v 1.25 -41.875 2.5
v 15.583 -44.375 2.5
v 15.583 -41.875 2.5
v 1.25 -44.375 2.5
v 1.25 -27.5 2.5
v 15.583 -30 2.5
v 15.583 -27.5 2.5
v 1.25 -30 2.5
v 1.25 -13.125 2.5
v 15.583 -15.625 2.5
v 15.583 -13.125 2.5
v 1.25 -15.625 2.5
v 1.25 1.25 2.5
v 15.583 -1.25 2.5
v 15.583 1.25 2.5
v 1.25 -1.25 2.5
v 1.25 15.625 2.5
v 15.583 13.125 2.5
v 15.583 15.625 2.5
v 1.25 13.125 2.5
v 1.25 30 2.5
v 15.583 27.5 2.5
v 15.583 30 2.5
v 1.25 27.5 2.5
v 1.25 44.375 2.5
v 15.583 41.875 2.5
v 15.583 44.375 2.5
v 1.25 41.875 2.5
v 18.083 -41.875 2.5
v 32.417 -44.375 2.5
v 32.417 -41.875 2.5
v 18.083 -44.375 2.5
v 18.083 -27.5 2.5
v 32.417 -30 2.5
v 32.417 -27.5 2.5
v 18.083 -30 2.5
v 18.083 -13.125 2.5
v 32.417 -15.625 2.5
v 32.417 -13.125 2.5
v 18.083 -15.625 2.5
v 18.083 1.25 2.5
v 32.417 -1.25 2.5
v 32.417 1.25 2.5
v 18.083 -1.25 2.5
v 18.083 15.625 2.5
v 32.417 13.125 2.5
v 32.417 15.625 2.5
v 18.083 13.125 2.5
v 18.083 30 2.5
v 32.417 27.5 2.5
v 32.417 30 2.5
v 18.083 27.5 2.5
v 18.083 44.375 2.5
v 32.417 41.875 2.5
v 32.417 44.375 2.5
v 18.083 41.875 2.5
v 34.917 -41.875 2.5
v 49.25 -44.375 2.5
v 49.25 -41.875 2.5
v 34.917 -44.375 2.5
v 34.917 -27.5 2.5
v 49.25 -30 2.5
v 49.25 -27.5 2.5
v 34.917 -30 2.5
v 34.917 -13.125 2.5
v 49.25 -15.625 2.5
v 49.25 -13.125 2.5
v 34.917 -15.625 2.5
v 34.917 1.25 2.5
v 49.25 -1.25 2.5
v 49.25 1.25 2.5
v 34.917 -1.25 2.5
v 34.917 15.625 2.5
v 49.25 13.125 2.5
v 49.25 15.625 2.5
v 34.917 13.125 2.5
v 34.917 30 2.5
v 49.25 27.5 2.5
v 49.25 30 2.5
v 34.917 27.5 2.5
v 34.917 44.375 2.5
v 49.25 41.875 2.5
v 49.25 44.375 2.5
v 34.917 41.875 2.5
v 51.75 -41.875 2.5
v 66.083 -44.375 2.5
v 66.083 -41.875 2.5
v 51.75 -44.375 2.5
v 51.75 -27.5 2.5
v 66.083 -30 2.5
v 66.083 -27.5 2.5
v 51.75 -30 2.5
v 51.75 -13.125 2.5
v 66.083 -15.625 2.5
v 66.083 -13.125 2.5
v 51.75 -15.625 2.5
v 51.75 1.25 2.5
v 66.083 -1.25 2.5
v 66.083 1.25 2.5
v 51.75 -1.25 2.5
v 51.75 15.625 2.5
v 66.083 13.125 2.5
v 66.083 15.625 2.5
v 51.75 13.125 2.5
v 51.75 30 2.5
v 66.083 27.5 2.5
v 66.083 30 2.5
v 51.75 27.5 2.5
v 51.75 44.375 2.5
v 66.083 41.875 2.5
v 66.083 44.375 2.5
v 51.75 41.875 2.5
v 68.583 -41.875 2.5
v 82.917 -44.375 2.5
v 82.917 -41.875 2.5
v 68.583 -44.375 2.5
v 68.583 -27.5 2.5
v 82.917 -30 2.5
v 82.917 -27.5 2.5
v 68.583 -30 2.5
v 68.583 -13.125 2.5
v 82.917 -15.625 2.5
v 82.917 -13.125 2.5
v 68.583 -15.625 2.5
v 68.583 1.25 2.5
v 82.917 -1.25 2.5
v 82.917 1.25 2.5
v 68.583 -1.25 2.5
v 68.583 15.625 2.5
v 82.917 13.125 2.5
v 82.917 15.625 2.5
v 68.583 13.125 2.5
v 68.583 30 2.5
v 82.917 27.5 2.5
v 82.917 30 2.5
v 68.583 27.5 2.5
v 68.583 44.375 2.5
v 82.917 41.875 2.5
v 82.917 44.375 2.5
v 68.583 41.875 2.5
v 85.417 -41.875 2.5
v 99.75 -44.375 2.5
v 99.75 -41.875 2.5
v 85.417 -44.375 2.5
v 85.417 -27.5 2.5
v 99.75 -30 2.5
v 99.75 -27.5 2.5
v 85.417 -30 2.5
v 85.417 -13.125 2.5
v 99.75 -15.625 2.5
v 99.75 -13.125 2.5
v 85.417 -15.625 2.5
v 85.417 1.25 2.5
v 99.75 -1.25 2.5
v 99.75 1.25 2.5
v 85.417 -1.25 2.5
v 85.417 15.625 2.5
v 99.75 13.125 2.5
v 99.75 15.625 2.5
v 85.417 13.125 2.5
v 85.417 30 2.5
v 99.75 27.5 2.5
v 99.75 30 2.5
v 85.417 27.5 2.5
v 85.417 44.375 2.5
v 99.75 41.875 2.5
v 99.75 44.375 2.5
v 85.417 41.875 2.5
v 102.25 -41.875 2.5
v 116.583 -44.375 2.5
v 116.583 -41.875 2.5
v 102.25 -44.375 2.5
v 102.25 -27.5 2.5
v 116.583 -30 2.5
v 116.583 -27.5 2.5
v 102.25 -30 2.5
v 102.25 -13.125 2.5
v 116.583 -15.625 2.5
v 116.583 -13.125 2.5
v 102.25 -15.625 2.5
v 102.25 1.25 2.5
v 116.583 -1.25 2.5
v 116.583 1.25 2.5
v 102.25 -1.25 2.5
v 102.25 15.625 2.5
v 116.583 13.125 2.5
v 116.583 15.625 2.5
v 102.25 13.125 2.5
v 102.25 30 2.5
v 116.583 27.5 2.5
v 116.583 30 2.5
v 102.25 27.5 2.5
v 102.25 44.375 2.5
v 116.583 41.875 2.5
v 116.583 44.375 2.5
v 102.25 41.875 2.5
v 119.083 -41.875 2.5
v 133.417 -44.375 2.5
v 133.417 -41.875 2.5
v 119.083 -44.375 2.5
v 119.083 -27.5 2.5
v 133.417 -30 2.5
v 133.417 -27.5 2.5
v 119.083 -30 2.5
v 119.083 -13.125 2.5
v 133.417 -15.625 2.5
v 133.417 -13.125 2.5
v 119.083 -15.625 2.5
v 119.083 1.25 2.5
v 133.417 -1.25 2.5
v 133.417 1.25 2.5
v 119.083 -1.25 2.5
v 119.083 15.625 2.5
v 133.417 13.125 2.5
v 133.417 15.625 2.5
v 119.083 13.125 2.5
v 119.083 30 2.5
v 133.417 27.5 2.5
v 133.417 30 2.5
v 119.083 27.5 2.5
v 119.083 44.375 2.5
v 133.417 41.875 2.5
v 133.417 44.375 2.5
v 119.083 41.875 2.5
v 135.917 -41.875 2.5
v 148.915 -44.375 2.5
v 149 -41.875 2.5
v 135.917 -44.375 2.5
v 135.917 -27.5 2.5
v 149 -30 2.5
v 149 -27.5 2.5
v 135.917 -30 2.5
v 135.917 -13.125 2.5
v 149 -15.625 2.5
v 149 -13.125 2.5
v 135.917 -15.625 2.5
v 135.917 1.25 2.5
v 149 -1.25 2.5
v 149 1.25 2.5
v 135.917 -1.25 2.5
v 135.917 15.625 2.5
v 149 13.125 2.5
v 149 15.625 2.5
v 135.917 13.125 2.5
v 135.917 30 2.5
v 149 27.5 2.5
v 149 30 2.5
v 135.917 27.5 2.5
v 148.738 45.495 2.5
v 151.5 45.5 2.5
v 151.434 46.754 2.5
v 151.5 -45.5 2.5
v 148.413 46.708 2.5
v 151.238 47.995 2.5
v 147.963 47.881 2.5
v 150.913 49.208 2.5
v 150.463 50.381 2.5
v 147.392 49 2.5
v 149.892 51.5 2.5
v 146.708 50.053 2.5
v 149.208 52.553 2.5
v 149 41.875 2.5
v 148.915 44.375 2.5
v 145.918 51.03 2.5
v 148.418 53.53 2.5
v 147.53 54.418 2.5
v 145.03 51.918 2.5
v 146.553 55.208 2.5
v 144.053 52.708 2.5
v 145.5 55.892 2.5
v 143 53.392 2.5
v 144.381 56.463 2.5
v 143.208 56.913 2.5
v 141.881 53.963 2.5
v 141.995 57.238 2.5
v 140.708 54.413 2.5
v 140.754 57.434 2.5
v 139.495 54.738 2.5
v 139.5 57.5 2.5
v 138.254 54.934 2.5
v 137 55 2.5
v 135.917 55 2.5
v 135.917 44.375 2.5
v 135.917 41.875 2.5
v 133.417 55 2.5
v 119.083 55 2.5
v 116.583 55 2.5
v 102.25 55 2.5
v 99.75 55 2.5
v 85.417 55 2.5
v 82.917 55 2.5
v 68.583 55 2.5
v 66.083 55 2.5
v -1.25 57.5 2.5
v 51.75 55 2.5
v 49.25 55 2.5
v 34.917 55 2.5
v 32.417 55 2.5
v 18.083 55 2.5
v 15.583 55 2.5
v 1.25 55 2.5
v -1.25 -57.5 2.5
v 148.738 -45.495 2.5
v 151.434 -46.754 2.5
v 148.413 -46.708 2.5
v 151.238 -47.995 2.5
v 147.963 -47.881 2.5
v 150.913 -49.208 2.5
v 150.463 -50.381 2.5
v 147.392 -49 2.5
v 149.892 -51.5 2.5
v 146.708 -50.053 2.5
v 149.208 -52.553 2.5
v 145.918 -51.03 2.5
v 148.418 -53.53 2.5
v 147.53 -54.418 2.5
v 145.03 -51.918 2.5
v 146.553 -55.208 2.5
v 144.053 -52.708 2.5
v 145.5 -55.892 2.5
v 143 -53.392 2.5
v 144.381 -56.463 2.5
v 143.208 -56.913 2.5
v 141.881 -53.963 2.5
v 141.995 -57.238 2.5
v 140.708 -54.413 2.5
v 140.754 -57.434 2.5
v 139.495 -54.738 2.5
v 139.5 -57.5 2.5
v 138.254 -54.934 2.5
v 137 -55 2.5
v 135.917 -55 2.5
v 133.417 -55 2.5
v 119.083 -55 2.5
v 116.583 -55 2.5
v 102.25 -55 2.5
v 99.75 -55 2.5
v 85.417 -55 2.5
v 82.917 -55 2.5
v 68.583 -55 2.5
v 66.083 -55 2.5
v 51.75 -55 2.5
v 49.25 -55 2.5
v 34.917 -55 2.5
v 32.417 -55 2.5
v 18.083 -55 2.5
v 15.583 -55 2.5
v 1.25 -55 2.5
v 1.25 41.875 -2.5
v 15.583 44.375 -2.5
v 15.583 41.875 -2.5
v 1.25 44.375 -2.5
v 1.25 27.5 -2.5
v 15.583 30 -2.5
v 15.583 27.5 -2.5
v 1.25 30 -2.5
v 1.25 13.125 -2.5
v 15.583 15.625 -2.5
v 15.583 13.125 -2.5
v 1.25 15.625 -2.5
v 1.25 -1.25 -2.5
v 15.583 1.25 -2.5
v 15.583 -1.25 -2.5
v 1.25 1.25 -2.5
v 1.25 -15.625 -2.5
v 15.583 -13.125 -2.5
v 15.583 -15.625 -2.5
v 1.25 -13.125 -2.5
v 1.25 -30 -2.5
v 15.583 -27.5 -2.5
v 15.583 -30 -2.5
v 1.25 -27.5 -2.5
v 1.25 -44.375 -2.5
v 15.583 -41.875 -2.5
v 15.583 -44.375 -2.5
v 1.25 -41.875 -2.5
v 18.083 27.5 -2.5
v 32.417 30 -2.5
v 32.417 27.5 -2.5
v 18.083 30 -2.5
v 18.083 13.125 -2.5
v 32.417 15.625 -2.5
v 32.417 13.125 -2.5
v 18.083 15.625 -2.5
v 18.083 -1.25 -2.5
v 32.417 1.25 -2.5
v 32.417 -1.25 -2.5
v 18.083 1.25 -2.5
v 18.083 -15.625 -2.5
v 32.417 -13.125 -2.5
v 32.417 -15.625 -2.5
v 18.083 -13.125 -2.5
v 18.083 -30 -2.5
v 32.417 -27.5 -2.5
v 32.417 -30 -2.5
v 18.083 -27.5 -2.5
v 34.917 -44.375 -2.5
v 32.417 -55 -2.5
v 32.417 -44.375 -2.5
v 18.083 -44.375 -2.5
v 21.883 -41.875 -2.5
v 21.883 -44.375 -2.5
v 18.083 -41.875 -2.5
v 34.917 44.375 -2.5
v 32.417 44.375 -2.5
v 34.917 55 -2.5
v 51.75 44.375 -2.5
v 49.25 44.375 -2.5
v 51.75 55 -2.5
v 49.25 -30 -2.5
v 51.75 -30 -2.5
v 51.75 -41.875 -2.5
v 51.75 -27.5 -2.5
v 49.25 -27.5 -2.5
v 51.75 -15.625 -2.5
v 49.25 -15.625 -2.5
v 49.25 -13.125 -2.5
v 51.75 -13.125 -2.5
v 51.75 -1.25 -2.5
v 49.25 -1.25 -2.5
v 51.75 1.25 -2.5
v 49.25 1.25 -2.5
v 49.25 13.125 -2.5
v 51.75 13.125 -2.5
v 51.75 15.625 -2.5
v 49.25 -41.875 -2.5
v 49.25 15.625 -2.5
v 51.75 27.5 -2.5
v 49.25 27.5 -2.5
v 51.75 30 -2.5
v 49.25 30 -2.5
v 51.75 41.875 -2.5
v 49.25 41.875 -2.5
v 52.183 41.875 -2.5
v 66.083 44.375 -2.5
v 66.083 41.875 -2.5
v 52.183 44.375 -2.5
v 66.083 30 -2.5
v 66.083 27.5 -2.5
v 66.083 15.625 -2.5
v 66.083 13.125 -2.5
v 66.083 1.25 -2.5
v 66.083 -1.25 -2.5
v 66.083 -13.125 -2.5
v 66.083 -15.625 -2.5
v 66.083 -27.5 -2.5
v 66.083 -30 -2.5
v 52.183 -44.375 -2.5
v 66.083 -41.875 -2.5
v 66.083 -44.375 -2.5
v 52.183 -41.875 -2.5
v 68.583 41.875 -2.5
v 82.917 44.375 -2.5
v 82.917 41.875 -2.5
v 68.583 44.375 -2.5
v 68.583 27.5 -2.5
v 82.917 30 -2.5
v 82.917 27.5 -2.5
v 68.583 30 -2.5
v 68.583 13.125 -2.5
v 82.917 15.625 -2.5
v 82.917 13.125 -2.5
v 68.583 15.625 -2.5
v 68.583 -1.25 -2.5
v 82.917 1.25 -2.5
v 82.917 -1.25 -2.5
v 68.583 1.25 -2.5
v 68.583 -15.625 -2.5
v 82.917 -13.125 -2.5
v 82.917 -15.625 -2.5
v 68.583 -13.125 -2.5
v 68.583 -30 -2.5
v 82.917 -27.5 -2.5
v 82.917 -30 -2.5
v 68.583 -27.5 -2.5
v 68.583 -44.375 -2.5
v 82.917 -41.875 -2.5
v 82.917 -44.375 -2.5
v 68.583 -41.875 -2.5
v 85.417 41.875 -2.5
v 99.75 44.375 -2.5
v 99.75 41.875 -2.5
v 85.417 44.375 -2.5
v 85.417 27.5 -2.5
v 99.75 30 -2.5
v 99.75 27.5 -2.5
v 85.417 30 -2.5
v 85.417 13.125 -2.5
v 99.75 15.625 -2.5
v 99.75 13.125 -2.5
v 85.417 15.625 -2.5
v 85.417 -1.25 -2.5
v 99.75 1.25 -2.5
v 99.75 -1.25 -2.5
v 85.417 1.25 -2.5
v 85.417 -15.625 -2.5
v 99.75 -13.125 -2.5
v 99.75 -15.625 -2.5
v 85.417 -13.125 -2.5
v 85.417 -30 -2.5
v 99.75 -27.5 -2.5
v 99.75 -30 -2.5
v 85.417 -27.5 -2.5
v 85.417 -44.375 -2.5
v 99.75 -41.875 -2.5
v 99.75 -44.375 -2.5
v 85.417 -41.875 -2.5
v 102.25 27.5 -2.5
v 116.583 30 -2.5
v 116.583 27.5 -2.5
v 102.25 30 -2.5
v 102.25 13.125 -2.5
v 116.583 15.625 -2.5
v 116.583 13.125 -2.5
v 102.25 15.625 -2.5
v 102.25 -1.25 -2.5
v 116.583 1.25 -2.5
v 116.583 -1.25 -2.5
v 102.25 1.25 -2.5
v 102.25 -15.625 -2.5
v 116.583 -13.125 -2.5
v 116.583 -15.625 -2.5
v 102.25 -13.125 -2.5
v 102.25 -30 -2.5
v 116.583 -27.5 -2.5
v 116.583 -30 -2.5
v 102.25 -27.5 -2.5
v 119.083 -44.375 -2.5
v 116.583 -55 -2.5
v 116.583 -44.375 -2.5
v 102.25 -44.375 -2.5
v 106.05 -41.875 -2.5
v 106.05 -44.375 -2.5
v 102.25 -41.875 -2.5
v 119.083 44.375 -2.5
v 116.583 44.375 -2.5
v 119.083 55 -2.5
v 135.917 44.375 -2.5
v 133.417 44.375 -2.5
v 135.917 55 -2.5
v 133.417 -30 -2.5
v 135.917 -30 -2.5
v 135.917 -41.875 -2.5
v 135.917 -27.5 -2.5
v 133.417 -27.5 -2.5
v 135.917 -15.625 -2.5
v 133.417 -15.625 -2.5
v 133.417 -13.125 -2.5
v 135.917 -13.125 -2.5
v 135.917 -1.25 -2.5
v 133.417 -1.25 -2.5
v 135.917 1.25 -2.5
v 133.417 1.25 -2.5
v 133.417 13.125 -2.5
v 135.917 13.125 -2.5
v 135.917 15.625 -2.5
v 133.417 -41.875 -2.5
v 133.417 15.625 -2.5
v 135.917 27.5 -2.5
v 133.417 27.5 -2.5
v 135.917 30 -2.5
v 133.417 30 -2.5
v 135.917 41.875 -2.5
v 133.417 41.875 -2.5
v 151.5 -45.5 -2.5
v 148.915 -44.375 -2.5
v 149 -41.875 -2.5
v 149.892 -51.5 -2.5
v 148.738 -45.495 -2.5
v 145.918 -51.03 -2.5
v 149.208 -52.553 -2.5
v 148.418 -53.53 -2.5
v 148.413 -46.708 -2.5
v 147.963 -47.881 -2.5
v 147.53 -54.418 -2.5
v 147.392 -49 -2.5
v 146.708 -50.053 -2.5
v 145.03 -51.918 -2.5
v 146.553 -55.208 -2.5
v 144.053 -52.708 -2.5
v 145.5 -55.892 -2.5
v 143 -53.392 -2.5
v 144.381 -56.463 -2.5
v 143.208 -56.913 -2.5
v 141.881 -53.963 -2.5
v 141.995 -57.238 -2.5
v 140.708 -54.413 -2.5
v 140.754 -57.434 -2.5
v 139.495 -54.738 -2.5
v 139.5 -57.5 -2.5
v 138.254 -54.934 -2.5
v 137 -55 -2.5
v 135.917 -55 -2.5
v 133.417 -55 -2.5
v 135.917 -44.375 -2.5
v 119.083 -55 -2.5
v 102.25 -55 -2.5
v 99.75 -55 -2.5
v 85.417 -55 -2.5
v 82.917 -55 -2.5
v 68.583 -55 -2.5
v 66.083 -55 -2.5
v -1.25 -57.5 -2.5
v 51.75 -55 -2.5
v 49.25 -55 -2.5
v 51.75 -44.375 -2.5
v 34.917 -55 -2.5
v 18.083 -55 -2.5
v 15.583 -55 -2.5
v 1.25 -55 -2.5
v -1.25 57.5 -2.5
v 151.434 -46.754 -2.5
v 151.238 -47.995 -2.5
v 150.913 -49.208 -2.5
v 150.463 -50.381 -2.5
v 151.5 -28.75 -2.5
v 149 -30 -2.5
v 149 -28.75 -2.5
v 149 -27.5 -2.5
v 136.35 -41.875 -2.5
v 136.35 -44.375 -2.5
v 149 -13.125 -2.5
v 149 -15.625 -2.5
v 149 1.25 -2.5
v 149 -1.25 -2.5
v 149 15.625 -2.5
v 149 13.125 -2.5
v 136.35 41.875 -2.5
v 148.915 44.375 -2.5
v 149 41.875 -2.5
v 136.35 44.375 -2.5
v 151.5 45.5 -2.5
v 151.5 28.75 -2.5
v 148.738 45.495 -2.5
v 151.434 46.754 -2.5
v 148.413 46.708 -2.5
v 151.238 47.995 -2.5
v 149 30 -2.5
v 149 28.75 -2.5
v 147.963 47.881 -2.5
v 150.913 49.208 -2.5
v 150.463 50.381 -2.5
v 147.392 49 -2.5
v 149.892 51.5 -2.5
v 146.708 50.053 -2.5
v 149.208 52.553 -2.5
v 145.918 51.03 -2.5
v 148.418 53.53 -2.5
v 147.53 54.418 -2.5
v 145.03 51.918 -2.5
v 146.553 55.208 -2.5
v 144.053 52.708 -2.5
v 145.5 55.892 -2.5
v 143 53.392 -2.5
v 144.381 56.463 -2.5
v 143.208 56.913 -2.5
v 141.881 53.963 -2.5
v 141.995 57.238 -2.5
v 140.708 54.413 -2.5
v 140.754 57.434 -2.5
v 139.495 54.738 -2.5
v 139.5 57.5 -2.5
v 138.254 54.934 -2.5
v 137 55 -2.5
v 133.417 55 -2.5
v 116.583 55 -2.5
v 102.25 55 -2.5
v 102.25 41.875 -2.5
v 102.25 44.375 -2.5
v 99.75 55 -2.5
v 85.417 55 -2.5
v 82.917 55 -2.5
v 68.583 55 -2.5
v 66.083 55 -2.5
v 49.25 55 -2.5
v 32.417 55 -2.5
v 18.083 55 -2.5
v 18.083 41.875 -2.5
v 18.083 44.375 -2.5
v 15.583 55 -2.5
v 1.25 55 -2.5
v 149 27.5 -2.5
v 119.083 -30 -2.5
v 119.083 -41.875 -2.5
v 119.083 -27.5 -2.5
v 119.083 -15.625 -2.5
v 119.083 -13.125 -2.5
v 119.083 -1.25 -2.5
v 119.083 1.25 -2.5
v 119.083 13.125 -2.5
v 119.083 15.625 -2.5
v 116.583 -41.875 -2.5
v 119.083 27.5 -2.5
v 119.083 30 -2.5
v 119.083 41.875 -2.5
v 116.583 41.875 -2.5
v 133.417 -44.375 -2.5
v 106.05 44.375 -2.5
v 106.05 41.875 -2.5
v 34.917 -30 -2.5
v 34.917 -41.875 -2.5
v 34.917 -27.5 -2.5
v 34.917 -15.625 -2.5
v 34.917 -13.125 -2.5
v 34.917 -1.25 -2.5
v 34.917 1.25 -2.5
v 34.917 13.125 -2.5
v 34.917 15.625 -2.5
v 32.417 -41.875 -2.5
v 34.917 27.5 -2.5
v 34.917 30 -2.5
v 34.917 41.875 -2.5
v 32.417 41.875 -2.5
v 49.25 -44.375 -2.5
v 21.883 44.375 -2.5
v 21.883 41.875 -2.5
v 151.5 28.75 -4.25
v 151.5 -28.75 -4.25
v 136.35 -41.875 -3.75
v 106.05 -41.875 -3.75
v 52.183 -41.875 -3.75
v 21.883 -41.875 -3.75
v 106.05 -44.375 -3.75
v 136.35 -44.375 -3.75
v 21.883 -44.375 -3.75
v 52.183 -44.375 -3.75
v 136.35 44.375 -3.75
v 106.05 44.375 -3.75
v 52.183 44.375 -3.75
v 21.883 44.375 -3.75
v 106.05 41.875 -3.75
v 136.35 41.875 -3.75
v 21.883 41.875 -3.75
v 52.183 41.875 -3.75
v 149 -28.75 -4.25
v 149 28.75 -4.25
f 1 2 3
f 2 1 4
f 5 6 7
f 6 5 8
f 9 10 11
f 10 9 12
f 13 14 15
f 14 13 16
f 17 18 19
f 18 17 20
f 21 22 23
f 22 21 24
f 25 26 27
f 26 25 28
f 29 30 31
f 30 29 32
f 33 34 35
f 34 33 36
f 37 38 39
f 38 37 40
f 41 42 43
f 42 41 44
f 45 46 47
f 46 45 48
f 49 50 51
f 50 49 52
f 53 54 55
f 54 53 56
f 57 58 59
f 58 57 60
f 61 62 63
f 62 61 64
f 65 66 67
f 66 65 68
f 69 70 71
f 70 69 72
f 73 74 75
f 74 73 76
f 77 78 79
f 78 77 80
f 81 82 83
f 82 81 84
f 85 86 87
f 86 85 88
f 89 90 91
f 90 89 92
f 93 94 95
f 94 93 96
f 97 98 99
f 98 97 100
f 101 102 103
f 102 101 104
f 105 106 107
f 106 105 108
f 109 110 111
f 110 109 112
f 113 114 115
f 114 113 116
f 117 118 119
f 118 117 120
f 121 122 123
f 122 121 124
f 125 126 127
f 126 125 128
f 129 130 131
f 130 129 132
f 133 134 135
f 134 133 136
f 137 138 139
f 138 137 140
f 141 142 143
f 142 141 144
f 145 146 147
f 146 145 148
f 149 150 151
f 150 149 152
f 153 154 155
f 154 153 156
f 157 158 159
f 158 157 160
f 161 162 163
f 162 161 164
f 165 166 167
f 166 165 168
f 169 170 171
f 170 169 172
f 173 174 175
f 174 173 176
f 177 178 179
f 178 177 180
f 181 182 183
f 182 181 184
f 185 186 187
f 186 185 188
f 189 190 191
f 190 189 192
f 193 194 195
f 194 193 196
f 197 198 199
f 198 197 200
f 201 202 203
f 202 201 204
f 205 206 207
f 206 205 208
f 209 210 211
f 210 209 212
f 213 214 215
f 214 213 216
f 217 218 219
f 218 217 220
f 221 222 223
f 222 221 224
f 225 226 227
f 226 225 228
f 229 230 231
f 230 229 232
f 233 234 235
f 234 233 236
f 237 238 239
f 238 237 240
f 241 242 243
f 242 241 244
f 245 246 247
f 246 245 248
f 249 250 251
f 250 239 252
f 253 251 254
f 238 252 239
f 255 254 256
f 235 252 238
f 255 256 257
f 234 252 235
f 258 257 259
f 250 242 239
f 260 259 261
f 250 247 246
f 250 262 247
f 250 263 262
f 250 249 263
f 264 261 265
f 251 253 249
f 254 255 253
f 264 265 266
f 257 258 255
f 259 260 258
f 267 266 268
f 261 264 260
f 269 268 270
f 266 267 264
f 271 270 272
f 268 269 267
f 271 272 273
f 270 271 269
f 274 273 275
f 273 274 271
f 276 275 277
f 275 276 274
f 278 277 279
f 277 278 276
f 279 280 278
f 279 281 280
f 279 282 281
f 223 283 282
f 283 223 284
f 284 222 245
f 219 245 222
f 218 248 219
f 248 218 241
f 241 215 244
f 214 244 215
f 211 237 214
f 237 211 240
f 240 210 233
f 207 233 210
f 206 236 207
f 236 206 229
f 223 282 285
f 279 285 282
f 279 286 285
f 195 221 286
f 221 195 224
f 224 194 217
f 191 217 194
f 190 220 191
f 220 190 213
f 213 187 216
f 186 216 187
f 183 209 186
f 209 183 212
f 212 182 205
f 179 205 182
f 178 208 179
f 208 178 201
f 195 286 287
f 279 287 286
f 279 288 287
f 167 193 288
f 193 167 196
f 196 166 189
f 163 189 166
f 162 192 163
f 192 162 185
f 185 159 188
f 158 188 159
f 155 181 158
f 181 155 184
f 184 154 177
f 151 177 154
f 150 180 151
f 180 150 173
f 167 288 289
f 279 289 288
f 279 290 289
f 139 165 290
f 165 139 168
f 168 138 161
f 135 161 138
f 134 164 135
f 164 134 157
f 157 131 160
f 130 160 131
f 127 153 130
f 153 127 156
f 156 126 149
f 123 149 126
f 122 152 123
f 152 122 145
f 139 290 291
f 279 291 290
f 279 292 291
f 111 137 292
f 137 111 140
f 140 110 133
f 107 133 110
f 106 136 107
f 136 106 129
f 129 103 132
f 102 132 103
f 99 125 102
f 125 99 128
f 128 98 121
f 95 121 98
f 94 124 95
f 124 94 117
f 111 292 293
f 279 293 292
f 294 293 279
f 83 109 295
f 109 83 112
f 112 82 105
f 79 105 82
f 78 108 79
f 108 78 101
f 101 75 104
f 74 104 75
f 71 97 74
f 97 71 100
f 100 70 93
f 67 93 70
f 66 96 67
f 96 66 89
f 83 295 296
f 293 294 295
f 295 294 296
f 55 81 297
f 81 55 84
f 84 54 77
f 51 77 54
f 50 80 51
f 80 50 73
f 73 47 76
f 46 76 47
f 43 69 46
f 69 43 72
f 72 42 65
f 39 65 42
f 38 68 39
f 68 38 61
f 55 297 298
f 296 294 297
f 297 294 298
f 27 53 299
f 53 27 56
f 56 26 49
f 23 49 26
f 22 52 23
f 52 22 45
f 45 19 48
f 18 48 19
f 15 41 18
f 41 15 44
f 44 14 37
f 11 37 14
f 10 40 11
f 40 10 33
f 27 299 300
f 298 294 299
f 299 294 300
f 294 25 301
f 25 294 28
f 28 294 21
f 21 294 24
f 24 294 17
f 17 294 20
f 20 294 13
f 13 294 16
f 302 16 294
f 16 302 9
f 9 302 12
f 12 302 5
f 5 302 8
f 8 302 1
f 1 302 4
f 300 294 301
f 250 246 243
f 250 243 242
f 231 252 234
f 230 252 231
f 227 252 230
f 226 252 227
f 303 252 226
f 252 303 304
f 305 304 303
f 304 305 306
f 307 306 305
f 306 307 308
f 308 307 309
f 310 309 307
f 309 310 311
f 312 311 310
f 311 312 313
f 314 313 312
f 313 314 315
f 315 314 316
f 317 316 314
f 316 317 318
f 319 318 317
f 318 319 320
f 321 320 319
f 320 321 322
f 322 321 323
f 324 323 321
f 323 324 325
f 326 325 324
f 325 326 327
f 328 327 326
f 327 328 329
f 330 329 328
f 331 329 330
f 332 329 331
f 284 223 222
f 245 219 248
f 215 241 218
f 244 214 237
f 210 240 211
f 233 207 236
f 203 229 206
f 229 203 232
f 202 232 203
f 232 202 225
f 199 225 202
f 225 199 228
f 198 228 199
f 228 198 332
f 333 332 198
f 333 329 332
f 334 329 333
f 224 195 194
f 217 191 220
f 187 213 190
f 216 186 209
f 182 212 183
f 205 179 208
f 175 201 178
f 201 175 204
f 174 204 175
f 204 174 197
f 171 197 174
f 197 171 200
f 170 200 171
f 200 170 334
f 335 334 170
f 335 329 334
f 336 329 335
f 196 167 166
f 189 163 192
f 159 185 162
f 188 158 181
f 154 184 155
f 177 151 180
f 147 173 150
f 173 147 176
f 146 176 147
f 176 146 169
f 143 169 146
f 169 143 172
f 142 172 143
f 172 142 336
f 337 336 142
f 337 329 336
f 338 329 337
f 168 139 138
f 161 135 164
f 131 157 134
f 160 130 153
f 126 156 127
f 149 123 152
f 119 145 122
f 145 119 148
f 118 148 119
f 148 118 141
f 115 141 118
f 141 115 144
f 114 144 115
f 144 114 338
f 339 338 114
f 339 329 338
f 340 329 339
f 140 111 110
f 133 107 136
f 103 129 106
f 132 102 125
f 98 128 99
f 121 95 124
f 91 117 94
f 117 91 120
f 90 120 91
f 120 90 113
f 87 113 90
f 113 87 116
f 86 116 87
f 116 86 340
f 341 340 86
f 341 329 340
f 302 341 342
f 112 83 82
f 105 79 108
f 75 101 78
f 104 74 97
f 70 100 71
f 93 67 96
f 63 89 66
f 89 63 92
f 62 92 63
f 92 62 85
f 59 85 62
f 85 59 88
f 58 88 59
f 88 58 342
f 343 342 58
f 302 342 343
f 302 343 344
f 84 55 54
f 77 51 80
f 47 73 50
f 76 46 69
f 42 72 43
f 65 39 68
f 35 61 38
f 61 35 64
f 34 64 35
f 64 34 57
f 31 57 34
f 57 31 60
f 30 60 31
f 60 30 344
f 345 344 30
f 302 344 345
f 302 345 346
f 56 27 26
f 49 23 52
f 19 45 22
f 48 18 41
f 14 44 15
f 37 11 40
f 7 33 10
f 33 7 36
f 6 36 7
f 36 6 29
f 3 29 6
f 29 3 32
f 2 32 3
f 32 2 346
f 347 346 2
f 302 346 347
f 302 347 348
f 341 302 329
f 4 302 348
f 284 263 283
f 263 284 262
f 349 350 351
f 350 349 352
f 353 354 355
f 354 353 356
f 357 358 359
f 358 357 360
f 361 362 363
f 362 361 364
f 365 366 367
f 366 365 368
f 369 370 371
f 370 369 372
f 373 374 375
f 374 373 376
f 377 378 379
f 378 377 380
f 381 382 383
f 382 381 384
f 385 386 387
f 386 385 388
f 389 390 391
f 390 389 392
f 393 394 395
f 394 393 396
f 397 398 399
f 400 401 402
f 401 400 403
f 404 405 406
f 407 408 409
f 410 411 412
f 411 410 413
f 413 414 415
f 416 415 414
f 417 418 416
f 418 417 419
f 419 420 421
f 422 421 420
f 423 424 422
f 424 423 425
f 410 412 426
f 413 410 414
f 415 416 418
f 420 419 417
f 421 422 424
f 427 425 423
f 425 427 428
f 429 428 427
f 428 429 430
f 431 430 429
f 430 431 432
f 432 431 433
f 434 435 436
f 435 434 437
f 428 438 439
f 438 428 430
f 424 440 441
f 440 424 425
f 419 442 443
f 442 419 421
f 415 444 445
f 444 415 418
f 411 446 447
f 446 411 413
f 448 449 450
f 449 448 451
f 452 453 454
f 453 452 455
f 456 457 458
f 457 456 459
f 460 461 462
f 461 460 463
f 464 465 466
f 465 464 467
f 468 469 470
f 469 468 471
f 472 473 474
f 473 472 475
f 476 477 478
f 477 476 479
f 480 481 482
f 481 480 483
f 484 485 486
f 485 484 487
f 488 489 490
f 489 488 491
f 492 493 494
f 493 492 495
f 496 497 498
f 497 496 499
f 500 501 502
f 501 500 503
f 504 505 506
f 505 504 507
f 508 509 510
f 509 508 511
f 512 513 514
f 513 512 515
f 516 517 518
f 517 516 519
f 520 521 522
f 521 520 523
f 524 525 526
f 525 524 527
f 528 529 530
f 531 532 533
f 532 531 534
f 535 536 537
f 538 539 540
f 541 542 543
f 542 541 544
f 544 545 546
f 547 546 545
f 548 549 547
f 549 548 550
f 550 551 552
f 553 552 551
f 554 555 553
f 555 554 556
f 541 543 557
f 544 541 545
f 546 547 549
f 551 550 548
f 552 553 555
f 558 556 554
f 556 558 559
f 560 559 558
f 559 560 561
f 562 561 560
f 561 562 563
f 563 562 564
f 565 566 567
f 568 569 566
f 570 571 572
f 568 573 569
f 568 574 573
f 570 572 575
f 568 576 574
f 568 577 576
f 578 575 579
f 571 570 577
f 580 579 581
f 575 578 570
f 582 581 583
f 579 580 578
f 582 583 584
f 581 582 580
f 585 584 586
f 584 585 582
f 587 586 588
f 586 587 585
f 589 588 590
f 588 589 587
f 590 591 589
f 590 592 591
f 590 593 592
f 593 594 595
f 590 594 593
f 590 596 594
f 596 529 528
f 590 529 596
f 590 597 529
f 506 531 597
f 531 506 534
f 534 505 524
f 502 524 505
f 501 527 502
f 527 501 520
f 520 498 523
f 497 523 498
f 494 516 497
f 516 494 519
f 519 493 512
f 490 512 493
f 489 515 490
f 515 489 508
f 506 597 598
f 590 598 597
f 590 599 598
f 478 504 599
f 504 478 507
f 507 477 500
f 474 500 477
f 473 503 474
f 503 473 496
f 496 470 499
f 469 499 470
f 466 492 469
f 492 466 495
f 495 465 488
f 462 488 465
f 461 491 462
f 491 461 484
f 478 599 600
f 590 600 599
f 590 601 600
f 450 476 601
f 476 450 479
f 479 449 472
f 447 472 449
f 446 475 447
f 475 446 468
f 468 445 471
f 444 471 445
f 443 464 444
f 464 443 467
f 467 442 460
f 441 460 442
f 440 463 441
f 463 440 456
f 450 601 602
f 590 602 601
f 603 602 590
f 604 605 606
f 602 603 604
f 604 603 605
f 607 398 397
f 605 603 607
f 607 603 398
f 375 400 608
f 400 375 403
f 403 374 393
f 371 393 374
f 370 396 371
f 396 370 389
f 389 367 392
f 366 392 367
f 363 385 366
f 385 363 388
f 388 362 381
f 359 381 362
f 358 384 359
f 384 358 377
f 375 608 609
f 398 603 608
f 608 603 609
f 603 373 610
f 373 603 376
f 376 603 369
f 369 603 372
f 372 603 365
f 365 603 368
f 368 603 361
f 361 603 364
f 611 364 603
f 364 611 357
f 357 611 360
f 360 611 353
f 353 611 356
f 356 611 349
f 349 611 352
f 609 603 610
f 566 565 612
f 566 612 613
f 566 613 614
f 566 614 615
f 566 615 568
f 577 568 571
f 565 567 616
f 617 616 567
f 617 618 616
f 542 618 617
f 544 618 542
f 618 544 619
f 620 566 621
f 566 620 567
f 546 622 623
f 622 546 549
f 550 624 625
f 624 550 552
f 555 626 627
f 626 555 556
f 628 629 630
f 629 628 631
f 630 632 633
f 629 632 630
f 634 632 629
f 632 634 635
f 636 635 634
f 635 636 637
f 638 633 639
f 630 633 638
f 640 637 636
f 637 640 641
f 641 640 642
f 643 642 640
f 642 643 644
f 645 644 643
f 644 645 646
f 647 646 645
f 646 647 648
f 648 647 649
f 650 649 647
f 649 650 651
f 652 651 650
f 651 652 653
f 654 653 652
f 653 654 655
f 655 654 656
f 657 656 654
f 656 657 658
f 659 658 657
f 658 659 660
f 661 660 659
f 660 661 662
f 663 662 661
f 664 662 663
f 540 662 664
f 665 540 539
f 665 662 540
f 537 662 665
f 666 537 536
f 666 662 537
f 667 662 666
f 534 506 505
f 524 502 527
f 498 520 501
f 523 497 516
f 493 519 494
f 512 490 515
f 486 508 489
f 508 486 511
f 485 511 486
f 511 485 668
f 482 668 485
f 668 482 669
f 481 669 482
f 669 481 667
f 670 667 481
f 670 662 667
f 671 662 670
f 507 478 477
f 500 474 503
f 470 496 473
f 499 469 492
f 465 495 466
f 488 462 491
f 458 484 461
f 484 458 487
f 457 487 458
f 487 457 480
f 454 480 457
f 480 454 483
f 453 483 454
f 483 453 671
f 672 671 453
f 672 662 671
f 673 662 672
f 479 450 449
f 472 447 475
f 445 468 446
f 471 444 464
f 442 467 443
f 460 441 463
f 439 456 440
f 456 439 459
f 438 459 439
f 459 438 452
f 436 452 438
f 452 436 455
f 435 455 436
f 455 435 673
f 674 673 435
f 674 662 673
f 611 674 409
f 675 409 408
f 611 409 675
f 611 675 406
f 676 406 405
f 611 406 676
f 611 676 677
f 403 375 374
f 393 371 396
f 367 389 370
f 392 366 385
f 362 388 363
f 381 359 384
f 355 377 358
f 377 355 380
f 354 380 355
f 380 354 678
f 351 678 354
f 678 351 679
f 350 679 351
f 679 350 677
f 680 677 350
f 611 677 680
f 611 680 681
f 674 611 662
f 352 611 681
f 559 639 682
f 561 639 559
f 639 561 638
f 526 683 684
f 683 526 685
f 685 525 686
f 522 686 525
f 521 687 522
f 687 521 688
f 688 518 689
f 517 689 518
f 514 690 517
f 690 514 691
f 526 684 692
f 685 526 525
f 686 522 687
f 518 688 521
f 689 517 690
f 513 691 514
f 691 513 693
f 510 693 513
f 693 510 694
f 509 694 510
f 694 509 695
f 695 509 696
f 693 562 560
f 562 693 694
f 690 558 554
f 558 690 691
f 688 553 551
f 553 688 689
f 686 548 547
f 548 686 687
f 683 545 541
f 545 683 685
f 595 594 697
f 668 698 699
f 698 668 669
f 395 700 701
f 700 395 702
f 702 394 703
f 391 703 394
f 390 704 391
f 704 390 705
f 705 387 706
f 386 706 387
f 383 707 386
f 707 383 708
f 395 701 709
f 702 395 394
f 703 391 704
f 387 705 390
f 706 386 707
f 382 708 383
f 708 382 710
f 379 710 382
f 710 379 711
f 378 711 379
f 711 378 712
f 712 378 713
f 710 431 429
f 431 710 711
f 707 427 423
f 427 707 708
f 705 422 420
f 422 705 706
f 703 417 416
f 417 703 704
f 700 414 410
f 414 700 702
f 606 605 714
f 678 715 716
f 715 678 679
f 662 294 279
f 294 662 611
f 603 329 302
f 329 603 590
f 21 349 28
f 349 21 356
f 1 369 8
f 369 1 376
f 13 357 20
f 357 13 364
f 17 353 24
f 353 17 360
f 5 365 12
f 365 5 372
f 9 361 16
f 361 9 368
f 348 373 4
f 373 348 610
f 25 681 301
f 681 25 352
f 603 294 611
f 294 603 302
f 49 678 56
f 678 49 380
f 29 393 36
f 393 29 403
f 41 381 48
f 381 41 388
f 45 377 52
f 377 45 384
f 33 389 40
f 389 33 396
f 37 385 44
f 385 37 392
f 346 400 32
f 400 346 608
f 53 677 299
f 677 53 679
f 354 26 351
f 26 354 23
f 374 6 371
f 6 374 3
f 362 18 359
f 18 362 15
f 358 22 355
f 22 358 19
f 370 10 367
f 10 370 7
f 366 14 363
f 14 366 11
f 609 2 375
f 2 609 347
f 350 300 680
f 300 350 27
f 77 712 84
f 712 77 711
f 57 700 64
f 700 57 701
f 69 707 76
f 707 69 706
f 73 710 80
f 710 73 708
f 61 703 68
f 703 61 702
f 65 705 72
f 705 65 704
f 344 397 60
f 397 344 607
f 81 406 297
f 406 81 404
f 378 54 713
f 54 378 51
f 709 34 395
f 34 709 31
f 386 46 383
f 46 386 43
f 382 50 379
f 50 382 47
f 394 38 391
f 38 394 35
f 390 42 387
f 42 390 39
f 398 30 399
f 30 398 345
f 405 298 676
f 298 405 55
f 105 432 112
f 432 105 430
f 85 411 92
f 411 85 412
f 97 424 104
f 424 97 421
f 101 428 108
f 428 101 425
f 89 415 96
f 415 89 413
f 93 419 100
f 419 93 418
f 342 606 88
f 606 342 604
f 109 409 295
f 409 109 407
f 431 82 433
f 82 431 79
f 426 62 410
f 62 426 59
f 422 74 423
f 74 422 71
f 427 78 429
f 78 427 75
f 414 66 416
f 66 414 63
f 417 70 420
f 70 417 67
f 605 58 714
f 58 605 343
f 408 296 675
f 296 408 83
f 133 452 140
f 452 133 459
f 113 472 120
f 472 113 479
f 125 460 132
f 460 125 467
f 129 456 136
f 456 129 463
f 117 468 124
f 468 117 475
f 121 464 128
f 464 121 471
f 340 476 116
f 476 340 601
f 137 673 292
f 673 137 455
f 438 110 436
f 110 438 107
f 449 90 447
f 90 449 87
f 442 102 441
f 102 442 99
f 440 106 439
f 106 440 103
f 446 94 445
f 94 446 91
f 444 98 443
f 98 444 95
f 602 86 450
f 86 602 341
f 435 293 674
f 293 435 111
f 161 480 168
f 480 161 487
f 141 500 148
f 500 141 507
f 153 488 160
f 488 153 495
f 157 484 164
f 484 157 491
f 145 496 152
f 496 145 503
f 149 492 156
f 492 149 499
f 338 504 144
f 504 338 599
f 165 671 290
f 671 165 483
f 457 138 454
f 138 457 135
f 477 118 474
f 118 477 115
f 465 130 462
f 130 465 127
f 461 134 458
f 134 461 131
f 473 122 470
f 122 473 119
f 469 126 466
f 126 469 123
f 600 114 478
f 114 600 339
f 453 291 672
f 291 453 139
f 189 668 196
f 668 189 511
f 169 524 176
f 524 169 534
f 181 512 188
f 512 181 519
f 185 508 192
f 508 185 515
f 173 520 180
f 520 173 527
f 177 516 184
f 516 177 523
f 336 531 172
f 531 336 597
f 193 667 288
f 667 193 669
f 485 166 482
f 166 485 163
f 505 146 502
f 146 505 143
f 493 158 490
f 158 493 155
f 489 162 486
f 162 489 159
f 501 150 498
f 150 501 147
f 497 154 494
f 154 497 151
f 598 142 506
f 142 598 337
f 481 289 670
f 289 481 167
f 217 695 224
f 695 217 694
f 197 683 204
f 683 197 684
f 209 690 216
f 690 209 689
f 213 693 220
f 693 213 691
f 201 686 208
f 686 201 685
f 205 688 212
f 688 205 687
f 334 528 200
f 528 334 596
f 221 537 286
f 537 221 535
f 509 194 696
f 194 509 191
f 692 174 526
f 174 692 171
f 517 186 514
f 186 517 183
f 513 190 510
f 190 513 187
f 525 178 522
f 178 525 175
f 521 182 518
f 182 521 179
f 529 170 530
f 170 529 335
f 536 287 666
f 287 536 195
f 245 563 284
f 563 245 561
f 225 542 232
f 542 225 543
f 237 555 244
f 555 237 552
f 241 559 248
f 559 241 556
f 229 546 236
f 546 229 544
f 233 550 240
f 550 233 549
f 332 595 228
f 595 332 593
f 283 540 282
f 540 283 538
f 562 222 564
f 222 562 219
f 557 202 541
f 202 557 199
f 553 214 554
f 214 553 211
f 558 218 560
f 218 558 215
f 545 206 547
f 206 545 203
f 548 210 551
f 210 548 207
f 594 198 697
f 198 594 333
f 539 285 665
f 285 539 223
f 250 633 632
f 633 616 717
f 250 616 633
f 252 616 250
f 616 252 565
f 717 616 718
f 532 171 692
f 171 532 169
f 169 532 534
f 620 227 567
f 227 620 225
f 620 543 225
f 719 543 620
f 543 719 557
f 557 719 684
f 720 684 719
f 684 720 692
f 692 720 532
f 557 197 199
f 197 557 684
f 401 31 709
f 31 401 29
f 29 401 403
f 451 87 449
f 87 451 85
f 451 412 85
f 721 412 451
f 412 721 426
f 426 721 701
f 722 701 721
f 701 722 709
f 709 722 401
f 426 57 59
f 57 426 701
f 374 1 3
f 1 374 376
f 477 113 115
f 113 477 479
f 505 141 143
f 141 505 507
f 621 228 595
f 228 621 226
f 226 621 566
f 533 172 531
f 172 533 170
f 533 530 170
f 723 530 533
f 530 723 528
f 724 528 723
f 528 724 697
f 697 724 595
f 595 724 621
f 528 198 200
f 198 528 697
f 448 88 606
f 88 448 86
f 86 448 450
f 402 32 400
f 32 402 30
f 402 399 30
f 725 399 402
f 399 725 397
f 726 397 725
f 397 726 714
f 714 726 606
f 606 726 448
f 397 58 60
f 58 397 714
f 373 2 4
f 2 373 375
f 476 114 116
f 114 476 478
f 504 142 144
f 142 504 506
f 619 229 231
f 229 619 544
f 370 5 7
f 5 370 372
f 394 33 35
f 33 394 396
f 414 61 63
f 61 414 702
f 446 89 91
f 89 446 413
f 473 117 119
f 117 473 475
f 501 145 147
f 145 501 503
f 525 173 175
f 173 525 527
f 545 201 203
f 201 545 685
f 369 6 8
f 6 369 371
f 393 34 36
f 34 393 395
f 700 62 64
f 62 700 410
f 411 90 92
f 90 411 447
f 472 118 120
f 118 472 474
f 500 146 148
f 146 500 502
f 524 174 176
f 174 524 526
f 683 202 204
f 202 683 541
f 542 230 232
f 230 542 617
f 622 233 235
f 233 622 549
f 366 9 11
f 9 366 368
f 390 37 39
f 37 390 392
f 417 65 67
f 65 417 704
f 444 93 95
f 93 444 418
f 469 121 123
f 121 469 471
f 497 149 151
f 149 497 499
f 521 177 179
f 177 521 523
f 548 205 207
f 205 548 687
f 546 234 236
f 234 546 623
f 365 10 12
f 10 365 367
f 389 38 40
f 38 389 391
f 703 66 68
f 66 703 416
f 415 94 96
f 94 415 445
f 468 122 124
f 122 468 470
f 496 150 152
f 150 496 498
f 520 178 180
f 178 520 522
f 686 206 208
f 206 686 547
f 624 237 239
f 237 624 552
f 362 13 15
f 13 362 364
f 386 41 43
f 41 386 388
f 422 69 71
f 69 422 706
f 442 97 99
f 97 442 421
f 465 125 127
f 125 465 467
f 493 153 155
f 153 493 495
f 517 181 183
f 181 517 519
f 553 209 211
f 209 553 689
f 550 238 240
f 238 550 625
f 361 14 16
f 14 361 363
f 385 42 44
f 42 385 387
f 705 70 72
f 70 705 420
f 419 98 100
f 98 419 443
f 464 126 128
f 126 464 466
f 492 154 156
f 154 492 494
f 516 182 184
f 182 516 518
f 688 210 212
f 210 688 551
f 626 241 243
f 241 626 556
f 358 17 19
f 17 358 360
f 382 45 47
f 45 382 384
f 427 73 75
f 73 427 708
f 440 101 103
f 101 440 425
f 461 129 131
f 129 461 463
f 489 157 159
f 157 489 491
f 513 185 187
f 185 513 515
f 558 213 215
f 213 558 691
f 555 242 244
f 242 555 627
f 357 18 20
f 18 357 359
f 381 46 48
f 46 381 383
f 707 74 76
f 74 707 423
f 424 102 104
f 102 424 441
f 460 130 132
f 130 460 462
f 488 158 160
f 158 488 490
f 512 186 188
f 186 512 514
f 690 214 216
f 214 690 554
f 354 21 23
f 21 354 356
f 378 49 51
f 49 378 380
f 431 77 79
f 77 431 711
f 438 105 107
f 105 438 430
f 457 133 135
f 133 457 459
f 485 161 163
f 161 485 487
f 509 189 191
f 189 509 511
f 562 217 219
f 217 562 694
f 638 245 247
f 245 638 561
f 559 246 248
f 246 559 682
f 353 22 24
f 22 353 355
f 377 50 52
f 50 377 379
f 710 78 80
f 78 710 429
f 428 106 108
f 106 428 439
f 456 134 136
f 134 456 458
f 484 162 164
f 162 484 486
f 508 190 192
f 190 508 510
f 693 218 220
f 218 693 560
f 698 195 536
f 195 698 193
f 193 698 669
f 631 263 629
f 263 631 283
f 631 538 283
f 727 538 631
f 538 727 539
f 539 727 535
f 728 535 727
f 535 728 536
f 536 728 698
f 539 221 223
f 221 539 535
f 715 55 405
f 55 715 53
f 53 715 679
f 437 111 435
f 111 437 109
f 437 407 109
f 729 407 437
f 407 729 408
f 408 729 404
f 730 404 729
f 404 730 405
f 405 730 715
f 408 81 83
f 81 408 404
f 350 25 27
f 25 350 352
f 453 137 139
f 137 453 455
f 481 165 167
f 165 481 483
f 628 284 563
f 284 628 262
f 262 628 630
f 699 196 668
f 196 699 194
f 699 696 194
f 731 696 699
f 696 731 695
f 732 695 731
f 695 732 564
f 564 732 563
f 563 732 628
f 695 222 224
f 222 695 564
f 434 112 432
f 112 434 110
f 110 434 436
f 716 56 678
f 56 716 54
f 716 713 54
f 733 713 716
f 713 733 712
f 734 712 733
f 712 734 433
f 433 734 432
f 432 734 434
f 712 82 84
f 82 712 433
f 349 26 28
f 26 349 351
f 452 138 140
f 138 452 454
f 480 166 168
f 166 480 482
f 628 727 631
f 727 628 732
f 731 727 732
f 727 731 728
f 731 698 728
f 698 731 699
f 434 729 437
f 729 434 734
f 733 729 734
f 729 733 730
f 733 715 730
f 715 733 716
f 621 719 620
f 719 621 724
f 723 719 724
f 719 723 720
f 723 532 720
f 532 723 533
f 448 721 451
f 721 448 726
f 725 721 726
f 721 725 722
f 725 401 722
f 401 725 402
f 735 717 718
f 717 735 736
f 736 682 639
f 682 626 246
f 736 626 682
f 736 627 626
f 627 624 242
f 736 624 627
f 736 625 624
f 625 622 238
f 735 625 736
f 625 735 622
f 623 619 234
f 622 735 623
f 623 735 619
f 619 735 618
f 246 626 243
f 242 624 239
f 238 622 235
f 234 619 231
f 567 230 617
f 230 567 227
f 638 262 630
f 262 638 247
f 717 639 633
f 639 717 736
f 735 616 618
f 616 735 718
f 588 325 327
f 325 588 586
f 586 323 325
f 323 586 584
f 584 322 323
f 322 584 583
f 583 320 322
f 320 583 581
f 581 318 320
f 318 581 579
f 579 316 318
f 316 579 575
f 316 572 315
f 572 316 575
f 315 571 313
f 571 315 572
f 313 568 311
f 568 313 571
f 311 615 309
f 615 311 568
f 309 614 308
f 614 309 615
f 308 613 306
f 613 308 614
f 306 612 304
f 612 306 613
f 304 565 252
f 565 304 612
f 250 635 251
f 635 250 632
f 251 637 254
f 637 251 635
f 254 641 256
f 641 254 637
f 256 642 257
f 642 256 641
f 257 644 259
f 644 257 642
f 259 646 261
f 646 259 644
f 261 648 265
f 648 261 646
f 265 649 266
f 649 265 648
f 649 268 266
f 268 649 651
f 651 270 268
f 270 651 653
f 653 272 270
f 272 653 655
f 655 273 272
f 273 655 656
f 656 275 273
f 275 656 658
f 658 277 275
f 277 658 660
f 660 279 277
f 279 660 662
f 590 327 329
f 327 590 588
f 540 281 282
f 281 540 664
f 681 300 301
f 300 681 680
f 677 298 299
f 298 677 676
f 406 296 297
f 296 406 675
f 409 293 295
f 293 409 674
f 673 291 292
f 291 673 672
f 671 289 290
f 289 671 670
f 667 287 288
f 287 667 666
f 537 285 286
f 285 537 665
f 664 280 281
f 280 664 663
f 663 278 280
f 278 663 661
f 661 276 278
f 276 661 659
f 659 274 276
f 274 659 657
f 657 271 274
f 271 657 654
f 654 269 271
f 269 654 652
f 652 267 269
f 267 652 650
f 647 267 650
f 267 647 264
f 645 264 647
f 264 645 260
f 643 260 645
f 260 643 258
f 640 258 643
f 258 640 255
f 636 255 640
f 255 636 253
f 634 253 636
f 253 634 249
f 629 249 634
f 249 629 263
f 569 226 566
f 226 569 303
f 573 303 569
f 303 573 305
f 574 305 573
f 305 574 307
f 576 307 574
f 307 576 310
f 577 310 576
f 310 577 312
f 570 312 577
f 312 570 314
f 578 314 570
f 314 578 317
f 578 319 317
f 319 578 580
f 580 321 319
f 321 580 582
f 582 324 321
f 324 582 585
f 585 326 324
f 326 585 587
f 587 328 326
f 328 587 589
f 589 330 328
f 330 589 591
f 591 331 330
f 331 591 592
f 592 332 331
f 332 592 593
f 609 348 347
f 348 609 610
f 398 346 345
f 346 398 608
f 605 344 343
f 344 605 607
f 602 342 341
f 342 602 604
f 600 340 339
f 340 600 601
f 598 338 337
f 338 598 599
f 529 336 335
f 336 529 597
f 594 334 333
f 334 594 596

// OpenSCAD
/*
 * A draining shower shelf cover
 */

$fn=60;
thickness = 2.5;

shelf_length=298+thickness*2;
shelf_width=115;
shelf_height=5;

number_x_spars = 18;
x_spar_spacing = shelf_length / number_x_spars;

number_y_spars = 8;
y_spar_spacing = shelf_width / number_y_spars;

corner_radius = 12;

foot_length=shelf_length/10;

module overhang_catch() {
   translate([0, 0, -shelf_height+3]) {
      cube([thickness, shelf_width/2, shelf_height*0.9], center=true);
   }
}

module overhang_catches() {
   translate([shelf_length/2-thickness/2, 0, 0]) overhang_catch();
   translate([-shelf_length/2+thickness/2, 0, 0]) overhang_catch();
}

module foot() {
   cube([foot_length, thickness, shelf_height/2], center=true);
}

module feet() {
   translate([shelf_length/2-foot_length, shelf_width/2-y_spar_spacing, -shelf_height/2]) foot();
   translate([shelf_length/2-foot_length-5*x_spar_spacing, shelf_width/2-y_spar_spacing, -shelf_height/2]) foot();
   translate([shelf_length/2-foot_length, -shelf_width/2+y_spar_spacing, -shelf_height/2]) foot();
   translate([shelf_length/2-foot_length-5*x_spar_spacing, -shelf_width/2+y_spar_spacing, -shelf_height/2]) foot();
   translate([-shelf_length/2+foot_length, -shelf_width/2+y_spar_spacing, -shelf_height/2]) foot();
   translate([-shelf_length/2+foot_length+5*x_spar_spacing, -shelf_width/2+y_spar_spacing, -shelf_height/2]) foot();
   translate([-shelf_length/2+foot_length, shelf_width/2-y_spar_spacing, -shelf_height/2]) foot();
   translate([-shelf_length/2+foot_length+5*x_spar_spacing, shelf_width/2-y_spar_spacing, -shelf_height/2]) foot();
}

module x_hatch() {
   for(x_offset = [x_spar_spacing : x_spar_spacing : shelf_length-x_spar_spacing]) {
      translate([x_offset-shelf_length/2, 0, 0]) {
         cube([thickness, shelf_width, shelf_height], center=true);
      }
   }
}

module y_hatch() {
   for(y_offset = [y_spar_spacing : y_spar_spacing : shelf_width-y_spar_spacing]) {
      translate([0, y_offset-shelf_width/2, 0]) {
         cube([shelf_length, thickness, shelf_height], center=true);
      }
   }
}

module base_shape(width, length) {
   minkowski() {
      square([length-2*corner_radius, width-2*corner_radius], center=true);
      circle(corner_radius);
   }
}

module base() {
   difference() {
      base_shape(shelf_width, shelf_length);
      base_shape(shelf_width-2*thickness, shelf_length-2*thickness);
   }
}

module body() {
   translate([0, 0, -shelf_height/2]) {
      linear_extrude(shelf_height) {
         base();
      }
   }
   x_hatch();
   y_hatch();
   feet();
   overhang_catches();
}

module half_body() {
   difference() {
      body();
      translate([-shelf_length/2-thickness/2, 0, 0]) {
         cube([shelf_length, shelf_width+10, shelf_height+30], center=true);
      }
   }
}


difference() {
   half_body();
   translate([0, 0, 12]) {
      // cube([shelf_length+10, shelf_width+10, 30], center=true);
   }
}
